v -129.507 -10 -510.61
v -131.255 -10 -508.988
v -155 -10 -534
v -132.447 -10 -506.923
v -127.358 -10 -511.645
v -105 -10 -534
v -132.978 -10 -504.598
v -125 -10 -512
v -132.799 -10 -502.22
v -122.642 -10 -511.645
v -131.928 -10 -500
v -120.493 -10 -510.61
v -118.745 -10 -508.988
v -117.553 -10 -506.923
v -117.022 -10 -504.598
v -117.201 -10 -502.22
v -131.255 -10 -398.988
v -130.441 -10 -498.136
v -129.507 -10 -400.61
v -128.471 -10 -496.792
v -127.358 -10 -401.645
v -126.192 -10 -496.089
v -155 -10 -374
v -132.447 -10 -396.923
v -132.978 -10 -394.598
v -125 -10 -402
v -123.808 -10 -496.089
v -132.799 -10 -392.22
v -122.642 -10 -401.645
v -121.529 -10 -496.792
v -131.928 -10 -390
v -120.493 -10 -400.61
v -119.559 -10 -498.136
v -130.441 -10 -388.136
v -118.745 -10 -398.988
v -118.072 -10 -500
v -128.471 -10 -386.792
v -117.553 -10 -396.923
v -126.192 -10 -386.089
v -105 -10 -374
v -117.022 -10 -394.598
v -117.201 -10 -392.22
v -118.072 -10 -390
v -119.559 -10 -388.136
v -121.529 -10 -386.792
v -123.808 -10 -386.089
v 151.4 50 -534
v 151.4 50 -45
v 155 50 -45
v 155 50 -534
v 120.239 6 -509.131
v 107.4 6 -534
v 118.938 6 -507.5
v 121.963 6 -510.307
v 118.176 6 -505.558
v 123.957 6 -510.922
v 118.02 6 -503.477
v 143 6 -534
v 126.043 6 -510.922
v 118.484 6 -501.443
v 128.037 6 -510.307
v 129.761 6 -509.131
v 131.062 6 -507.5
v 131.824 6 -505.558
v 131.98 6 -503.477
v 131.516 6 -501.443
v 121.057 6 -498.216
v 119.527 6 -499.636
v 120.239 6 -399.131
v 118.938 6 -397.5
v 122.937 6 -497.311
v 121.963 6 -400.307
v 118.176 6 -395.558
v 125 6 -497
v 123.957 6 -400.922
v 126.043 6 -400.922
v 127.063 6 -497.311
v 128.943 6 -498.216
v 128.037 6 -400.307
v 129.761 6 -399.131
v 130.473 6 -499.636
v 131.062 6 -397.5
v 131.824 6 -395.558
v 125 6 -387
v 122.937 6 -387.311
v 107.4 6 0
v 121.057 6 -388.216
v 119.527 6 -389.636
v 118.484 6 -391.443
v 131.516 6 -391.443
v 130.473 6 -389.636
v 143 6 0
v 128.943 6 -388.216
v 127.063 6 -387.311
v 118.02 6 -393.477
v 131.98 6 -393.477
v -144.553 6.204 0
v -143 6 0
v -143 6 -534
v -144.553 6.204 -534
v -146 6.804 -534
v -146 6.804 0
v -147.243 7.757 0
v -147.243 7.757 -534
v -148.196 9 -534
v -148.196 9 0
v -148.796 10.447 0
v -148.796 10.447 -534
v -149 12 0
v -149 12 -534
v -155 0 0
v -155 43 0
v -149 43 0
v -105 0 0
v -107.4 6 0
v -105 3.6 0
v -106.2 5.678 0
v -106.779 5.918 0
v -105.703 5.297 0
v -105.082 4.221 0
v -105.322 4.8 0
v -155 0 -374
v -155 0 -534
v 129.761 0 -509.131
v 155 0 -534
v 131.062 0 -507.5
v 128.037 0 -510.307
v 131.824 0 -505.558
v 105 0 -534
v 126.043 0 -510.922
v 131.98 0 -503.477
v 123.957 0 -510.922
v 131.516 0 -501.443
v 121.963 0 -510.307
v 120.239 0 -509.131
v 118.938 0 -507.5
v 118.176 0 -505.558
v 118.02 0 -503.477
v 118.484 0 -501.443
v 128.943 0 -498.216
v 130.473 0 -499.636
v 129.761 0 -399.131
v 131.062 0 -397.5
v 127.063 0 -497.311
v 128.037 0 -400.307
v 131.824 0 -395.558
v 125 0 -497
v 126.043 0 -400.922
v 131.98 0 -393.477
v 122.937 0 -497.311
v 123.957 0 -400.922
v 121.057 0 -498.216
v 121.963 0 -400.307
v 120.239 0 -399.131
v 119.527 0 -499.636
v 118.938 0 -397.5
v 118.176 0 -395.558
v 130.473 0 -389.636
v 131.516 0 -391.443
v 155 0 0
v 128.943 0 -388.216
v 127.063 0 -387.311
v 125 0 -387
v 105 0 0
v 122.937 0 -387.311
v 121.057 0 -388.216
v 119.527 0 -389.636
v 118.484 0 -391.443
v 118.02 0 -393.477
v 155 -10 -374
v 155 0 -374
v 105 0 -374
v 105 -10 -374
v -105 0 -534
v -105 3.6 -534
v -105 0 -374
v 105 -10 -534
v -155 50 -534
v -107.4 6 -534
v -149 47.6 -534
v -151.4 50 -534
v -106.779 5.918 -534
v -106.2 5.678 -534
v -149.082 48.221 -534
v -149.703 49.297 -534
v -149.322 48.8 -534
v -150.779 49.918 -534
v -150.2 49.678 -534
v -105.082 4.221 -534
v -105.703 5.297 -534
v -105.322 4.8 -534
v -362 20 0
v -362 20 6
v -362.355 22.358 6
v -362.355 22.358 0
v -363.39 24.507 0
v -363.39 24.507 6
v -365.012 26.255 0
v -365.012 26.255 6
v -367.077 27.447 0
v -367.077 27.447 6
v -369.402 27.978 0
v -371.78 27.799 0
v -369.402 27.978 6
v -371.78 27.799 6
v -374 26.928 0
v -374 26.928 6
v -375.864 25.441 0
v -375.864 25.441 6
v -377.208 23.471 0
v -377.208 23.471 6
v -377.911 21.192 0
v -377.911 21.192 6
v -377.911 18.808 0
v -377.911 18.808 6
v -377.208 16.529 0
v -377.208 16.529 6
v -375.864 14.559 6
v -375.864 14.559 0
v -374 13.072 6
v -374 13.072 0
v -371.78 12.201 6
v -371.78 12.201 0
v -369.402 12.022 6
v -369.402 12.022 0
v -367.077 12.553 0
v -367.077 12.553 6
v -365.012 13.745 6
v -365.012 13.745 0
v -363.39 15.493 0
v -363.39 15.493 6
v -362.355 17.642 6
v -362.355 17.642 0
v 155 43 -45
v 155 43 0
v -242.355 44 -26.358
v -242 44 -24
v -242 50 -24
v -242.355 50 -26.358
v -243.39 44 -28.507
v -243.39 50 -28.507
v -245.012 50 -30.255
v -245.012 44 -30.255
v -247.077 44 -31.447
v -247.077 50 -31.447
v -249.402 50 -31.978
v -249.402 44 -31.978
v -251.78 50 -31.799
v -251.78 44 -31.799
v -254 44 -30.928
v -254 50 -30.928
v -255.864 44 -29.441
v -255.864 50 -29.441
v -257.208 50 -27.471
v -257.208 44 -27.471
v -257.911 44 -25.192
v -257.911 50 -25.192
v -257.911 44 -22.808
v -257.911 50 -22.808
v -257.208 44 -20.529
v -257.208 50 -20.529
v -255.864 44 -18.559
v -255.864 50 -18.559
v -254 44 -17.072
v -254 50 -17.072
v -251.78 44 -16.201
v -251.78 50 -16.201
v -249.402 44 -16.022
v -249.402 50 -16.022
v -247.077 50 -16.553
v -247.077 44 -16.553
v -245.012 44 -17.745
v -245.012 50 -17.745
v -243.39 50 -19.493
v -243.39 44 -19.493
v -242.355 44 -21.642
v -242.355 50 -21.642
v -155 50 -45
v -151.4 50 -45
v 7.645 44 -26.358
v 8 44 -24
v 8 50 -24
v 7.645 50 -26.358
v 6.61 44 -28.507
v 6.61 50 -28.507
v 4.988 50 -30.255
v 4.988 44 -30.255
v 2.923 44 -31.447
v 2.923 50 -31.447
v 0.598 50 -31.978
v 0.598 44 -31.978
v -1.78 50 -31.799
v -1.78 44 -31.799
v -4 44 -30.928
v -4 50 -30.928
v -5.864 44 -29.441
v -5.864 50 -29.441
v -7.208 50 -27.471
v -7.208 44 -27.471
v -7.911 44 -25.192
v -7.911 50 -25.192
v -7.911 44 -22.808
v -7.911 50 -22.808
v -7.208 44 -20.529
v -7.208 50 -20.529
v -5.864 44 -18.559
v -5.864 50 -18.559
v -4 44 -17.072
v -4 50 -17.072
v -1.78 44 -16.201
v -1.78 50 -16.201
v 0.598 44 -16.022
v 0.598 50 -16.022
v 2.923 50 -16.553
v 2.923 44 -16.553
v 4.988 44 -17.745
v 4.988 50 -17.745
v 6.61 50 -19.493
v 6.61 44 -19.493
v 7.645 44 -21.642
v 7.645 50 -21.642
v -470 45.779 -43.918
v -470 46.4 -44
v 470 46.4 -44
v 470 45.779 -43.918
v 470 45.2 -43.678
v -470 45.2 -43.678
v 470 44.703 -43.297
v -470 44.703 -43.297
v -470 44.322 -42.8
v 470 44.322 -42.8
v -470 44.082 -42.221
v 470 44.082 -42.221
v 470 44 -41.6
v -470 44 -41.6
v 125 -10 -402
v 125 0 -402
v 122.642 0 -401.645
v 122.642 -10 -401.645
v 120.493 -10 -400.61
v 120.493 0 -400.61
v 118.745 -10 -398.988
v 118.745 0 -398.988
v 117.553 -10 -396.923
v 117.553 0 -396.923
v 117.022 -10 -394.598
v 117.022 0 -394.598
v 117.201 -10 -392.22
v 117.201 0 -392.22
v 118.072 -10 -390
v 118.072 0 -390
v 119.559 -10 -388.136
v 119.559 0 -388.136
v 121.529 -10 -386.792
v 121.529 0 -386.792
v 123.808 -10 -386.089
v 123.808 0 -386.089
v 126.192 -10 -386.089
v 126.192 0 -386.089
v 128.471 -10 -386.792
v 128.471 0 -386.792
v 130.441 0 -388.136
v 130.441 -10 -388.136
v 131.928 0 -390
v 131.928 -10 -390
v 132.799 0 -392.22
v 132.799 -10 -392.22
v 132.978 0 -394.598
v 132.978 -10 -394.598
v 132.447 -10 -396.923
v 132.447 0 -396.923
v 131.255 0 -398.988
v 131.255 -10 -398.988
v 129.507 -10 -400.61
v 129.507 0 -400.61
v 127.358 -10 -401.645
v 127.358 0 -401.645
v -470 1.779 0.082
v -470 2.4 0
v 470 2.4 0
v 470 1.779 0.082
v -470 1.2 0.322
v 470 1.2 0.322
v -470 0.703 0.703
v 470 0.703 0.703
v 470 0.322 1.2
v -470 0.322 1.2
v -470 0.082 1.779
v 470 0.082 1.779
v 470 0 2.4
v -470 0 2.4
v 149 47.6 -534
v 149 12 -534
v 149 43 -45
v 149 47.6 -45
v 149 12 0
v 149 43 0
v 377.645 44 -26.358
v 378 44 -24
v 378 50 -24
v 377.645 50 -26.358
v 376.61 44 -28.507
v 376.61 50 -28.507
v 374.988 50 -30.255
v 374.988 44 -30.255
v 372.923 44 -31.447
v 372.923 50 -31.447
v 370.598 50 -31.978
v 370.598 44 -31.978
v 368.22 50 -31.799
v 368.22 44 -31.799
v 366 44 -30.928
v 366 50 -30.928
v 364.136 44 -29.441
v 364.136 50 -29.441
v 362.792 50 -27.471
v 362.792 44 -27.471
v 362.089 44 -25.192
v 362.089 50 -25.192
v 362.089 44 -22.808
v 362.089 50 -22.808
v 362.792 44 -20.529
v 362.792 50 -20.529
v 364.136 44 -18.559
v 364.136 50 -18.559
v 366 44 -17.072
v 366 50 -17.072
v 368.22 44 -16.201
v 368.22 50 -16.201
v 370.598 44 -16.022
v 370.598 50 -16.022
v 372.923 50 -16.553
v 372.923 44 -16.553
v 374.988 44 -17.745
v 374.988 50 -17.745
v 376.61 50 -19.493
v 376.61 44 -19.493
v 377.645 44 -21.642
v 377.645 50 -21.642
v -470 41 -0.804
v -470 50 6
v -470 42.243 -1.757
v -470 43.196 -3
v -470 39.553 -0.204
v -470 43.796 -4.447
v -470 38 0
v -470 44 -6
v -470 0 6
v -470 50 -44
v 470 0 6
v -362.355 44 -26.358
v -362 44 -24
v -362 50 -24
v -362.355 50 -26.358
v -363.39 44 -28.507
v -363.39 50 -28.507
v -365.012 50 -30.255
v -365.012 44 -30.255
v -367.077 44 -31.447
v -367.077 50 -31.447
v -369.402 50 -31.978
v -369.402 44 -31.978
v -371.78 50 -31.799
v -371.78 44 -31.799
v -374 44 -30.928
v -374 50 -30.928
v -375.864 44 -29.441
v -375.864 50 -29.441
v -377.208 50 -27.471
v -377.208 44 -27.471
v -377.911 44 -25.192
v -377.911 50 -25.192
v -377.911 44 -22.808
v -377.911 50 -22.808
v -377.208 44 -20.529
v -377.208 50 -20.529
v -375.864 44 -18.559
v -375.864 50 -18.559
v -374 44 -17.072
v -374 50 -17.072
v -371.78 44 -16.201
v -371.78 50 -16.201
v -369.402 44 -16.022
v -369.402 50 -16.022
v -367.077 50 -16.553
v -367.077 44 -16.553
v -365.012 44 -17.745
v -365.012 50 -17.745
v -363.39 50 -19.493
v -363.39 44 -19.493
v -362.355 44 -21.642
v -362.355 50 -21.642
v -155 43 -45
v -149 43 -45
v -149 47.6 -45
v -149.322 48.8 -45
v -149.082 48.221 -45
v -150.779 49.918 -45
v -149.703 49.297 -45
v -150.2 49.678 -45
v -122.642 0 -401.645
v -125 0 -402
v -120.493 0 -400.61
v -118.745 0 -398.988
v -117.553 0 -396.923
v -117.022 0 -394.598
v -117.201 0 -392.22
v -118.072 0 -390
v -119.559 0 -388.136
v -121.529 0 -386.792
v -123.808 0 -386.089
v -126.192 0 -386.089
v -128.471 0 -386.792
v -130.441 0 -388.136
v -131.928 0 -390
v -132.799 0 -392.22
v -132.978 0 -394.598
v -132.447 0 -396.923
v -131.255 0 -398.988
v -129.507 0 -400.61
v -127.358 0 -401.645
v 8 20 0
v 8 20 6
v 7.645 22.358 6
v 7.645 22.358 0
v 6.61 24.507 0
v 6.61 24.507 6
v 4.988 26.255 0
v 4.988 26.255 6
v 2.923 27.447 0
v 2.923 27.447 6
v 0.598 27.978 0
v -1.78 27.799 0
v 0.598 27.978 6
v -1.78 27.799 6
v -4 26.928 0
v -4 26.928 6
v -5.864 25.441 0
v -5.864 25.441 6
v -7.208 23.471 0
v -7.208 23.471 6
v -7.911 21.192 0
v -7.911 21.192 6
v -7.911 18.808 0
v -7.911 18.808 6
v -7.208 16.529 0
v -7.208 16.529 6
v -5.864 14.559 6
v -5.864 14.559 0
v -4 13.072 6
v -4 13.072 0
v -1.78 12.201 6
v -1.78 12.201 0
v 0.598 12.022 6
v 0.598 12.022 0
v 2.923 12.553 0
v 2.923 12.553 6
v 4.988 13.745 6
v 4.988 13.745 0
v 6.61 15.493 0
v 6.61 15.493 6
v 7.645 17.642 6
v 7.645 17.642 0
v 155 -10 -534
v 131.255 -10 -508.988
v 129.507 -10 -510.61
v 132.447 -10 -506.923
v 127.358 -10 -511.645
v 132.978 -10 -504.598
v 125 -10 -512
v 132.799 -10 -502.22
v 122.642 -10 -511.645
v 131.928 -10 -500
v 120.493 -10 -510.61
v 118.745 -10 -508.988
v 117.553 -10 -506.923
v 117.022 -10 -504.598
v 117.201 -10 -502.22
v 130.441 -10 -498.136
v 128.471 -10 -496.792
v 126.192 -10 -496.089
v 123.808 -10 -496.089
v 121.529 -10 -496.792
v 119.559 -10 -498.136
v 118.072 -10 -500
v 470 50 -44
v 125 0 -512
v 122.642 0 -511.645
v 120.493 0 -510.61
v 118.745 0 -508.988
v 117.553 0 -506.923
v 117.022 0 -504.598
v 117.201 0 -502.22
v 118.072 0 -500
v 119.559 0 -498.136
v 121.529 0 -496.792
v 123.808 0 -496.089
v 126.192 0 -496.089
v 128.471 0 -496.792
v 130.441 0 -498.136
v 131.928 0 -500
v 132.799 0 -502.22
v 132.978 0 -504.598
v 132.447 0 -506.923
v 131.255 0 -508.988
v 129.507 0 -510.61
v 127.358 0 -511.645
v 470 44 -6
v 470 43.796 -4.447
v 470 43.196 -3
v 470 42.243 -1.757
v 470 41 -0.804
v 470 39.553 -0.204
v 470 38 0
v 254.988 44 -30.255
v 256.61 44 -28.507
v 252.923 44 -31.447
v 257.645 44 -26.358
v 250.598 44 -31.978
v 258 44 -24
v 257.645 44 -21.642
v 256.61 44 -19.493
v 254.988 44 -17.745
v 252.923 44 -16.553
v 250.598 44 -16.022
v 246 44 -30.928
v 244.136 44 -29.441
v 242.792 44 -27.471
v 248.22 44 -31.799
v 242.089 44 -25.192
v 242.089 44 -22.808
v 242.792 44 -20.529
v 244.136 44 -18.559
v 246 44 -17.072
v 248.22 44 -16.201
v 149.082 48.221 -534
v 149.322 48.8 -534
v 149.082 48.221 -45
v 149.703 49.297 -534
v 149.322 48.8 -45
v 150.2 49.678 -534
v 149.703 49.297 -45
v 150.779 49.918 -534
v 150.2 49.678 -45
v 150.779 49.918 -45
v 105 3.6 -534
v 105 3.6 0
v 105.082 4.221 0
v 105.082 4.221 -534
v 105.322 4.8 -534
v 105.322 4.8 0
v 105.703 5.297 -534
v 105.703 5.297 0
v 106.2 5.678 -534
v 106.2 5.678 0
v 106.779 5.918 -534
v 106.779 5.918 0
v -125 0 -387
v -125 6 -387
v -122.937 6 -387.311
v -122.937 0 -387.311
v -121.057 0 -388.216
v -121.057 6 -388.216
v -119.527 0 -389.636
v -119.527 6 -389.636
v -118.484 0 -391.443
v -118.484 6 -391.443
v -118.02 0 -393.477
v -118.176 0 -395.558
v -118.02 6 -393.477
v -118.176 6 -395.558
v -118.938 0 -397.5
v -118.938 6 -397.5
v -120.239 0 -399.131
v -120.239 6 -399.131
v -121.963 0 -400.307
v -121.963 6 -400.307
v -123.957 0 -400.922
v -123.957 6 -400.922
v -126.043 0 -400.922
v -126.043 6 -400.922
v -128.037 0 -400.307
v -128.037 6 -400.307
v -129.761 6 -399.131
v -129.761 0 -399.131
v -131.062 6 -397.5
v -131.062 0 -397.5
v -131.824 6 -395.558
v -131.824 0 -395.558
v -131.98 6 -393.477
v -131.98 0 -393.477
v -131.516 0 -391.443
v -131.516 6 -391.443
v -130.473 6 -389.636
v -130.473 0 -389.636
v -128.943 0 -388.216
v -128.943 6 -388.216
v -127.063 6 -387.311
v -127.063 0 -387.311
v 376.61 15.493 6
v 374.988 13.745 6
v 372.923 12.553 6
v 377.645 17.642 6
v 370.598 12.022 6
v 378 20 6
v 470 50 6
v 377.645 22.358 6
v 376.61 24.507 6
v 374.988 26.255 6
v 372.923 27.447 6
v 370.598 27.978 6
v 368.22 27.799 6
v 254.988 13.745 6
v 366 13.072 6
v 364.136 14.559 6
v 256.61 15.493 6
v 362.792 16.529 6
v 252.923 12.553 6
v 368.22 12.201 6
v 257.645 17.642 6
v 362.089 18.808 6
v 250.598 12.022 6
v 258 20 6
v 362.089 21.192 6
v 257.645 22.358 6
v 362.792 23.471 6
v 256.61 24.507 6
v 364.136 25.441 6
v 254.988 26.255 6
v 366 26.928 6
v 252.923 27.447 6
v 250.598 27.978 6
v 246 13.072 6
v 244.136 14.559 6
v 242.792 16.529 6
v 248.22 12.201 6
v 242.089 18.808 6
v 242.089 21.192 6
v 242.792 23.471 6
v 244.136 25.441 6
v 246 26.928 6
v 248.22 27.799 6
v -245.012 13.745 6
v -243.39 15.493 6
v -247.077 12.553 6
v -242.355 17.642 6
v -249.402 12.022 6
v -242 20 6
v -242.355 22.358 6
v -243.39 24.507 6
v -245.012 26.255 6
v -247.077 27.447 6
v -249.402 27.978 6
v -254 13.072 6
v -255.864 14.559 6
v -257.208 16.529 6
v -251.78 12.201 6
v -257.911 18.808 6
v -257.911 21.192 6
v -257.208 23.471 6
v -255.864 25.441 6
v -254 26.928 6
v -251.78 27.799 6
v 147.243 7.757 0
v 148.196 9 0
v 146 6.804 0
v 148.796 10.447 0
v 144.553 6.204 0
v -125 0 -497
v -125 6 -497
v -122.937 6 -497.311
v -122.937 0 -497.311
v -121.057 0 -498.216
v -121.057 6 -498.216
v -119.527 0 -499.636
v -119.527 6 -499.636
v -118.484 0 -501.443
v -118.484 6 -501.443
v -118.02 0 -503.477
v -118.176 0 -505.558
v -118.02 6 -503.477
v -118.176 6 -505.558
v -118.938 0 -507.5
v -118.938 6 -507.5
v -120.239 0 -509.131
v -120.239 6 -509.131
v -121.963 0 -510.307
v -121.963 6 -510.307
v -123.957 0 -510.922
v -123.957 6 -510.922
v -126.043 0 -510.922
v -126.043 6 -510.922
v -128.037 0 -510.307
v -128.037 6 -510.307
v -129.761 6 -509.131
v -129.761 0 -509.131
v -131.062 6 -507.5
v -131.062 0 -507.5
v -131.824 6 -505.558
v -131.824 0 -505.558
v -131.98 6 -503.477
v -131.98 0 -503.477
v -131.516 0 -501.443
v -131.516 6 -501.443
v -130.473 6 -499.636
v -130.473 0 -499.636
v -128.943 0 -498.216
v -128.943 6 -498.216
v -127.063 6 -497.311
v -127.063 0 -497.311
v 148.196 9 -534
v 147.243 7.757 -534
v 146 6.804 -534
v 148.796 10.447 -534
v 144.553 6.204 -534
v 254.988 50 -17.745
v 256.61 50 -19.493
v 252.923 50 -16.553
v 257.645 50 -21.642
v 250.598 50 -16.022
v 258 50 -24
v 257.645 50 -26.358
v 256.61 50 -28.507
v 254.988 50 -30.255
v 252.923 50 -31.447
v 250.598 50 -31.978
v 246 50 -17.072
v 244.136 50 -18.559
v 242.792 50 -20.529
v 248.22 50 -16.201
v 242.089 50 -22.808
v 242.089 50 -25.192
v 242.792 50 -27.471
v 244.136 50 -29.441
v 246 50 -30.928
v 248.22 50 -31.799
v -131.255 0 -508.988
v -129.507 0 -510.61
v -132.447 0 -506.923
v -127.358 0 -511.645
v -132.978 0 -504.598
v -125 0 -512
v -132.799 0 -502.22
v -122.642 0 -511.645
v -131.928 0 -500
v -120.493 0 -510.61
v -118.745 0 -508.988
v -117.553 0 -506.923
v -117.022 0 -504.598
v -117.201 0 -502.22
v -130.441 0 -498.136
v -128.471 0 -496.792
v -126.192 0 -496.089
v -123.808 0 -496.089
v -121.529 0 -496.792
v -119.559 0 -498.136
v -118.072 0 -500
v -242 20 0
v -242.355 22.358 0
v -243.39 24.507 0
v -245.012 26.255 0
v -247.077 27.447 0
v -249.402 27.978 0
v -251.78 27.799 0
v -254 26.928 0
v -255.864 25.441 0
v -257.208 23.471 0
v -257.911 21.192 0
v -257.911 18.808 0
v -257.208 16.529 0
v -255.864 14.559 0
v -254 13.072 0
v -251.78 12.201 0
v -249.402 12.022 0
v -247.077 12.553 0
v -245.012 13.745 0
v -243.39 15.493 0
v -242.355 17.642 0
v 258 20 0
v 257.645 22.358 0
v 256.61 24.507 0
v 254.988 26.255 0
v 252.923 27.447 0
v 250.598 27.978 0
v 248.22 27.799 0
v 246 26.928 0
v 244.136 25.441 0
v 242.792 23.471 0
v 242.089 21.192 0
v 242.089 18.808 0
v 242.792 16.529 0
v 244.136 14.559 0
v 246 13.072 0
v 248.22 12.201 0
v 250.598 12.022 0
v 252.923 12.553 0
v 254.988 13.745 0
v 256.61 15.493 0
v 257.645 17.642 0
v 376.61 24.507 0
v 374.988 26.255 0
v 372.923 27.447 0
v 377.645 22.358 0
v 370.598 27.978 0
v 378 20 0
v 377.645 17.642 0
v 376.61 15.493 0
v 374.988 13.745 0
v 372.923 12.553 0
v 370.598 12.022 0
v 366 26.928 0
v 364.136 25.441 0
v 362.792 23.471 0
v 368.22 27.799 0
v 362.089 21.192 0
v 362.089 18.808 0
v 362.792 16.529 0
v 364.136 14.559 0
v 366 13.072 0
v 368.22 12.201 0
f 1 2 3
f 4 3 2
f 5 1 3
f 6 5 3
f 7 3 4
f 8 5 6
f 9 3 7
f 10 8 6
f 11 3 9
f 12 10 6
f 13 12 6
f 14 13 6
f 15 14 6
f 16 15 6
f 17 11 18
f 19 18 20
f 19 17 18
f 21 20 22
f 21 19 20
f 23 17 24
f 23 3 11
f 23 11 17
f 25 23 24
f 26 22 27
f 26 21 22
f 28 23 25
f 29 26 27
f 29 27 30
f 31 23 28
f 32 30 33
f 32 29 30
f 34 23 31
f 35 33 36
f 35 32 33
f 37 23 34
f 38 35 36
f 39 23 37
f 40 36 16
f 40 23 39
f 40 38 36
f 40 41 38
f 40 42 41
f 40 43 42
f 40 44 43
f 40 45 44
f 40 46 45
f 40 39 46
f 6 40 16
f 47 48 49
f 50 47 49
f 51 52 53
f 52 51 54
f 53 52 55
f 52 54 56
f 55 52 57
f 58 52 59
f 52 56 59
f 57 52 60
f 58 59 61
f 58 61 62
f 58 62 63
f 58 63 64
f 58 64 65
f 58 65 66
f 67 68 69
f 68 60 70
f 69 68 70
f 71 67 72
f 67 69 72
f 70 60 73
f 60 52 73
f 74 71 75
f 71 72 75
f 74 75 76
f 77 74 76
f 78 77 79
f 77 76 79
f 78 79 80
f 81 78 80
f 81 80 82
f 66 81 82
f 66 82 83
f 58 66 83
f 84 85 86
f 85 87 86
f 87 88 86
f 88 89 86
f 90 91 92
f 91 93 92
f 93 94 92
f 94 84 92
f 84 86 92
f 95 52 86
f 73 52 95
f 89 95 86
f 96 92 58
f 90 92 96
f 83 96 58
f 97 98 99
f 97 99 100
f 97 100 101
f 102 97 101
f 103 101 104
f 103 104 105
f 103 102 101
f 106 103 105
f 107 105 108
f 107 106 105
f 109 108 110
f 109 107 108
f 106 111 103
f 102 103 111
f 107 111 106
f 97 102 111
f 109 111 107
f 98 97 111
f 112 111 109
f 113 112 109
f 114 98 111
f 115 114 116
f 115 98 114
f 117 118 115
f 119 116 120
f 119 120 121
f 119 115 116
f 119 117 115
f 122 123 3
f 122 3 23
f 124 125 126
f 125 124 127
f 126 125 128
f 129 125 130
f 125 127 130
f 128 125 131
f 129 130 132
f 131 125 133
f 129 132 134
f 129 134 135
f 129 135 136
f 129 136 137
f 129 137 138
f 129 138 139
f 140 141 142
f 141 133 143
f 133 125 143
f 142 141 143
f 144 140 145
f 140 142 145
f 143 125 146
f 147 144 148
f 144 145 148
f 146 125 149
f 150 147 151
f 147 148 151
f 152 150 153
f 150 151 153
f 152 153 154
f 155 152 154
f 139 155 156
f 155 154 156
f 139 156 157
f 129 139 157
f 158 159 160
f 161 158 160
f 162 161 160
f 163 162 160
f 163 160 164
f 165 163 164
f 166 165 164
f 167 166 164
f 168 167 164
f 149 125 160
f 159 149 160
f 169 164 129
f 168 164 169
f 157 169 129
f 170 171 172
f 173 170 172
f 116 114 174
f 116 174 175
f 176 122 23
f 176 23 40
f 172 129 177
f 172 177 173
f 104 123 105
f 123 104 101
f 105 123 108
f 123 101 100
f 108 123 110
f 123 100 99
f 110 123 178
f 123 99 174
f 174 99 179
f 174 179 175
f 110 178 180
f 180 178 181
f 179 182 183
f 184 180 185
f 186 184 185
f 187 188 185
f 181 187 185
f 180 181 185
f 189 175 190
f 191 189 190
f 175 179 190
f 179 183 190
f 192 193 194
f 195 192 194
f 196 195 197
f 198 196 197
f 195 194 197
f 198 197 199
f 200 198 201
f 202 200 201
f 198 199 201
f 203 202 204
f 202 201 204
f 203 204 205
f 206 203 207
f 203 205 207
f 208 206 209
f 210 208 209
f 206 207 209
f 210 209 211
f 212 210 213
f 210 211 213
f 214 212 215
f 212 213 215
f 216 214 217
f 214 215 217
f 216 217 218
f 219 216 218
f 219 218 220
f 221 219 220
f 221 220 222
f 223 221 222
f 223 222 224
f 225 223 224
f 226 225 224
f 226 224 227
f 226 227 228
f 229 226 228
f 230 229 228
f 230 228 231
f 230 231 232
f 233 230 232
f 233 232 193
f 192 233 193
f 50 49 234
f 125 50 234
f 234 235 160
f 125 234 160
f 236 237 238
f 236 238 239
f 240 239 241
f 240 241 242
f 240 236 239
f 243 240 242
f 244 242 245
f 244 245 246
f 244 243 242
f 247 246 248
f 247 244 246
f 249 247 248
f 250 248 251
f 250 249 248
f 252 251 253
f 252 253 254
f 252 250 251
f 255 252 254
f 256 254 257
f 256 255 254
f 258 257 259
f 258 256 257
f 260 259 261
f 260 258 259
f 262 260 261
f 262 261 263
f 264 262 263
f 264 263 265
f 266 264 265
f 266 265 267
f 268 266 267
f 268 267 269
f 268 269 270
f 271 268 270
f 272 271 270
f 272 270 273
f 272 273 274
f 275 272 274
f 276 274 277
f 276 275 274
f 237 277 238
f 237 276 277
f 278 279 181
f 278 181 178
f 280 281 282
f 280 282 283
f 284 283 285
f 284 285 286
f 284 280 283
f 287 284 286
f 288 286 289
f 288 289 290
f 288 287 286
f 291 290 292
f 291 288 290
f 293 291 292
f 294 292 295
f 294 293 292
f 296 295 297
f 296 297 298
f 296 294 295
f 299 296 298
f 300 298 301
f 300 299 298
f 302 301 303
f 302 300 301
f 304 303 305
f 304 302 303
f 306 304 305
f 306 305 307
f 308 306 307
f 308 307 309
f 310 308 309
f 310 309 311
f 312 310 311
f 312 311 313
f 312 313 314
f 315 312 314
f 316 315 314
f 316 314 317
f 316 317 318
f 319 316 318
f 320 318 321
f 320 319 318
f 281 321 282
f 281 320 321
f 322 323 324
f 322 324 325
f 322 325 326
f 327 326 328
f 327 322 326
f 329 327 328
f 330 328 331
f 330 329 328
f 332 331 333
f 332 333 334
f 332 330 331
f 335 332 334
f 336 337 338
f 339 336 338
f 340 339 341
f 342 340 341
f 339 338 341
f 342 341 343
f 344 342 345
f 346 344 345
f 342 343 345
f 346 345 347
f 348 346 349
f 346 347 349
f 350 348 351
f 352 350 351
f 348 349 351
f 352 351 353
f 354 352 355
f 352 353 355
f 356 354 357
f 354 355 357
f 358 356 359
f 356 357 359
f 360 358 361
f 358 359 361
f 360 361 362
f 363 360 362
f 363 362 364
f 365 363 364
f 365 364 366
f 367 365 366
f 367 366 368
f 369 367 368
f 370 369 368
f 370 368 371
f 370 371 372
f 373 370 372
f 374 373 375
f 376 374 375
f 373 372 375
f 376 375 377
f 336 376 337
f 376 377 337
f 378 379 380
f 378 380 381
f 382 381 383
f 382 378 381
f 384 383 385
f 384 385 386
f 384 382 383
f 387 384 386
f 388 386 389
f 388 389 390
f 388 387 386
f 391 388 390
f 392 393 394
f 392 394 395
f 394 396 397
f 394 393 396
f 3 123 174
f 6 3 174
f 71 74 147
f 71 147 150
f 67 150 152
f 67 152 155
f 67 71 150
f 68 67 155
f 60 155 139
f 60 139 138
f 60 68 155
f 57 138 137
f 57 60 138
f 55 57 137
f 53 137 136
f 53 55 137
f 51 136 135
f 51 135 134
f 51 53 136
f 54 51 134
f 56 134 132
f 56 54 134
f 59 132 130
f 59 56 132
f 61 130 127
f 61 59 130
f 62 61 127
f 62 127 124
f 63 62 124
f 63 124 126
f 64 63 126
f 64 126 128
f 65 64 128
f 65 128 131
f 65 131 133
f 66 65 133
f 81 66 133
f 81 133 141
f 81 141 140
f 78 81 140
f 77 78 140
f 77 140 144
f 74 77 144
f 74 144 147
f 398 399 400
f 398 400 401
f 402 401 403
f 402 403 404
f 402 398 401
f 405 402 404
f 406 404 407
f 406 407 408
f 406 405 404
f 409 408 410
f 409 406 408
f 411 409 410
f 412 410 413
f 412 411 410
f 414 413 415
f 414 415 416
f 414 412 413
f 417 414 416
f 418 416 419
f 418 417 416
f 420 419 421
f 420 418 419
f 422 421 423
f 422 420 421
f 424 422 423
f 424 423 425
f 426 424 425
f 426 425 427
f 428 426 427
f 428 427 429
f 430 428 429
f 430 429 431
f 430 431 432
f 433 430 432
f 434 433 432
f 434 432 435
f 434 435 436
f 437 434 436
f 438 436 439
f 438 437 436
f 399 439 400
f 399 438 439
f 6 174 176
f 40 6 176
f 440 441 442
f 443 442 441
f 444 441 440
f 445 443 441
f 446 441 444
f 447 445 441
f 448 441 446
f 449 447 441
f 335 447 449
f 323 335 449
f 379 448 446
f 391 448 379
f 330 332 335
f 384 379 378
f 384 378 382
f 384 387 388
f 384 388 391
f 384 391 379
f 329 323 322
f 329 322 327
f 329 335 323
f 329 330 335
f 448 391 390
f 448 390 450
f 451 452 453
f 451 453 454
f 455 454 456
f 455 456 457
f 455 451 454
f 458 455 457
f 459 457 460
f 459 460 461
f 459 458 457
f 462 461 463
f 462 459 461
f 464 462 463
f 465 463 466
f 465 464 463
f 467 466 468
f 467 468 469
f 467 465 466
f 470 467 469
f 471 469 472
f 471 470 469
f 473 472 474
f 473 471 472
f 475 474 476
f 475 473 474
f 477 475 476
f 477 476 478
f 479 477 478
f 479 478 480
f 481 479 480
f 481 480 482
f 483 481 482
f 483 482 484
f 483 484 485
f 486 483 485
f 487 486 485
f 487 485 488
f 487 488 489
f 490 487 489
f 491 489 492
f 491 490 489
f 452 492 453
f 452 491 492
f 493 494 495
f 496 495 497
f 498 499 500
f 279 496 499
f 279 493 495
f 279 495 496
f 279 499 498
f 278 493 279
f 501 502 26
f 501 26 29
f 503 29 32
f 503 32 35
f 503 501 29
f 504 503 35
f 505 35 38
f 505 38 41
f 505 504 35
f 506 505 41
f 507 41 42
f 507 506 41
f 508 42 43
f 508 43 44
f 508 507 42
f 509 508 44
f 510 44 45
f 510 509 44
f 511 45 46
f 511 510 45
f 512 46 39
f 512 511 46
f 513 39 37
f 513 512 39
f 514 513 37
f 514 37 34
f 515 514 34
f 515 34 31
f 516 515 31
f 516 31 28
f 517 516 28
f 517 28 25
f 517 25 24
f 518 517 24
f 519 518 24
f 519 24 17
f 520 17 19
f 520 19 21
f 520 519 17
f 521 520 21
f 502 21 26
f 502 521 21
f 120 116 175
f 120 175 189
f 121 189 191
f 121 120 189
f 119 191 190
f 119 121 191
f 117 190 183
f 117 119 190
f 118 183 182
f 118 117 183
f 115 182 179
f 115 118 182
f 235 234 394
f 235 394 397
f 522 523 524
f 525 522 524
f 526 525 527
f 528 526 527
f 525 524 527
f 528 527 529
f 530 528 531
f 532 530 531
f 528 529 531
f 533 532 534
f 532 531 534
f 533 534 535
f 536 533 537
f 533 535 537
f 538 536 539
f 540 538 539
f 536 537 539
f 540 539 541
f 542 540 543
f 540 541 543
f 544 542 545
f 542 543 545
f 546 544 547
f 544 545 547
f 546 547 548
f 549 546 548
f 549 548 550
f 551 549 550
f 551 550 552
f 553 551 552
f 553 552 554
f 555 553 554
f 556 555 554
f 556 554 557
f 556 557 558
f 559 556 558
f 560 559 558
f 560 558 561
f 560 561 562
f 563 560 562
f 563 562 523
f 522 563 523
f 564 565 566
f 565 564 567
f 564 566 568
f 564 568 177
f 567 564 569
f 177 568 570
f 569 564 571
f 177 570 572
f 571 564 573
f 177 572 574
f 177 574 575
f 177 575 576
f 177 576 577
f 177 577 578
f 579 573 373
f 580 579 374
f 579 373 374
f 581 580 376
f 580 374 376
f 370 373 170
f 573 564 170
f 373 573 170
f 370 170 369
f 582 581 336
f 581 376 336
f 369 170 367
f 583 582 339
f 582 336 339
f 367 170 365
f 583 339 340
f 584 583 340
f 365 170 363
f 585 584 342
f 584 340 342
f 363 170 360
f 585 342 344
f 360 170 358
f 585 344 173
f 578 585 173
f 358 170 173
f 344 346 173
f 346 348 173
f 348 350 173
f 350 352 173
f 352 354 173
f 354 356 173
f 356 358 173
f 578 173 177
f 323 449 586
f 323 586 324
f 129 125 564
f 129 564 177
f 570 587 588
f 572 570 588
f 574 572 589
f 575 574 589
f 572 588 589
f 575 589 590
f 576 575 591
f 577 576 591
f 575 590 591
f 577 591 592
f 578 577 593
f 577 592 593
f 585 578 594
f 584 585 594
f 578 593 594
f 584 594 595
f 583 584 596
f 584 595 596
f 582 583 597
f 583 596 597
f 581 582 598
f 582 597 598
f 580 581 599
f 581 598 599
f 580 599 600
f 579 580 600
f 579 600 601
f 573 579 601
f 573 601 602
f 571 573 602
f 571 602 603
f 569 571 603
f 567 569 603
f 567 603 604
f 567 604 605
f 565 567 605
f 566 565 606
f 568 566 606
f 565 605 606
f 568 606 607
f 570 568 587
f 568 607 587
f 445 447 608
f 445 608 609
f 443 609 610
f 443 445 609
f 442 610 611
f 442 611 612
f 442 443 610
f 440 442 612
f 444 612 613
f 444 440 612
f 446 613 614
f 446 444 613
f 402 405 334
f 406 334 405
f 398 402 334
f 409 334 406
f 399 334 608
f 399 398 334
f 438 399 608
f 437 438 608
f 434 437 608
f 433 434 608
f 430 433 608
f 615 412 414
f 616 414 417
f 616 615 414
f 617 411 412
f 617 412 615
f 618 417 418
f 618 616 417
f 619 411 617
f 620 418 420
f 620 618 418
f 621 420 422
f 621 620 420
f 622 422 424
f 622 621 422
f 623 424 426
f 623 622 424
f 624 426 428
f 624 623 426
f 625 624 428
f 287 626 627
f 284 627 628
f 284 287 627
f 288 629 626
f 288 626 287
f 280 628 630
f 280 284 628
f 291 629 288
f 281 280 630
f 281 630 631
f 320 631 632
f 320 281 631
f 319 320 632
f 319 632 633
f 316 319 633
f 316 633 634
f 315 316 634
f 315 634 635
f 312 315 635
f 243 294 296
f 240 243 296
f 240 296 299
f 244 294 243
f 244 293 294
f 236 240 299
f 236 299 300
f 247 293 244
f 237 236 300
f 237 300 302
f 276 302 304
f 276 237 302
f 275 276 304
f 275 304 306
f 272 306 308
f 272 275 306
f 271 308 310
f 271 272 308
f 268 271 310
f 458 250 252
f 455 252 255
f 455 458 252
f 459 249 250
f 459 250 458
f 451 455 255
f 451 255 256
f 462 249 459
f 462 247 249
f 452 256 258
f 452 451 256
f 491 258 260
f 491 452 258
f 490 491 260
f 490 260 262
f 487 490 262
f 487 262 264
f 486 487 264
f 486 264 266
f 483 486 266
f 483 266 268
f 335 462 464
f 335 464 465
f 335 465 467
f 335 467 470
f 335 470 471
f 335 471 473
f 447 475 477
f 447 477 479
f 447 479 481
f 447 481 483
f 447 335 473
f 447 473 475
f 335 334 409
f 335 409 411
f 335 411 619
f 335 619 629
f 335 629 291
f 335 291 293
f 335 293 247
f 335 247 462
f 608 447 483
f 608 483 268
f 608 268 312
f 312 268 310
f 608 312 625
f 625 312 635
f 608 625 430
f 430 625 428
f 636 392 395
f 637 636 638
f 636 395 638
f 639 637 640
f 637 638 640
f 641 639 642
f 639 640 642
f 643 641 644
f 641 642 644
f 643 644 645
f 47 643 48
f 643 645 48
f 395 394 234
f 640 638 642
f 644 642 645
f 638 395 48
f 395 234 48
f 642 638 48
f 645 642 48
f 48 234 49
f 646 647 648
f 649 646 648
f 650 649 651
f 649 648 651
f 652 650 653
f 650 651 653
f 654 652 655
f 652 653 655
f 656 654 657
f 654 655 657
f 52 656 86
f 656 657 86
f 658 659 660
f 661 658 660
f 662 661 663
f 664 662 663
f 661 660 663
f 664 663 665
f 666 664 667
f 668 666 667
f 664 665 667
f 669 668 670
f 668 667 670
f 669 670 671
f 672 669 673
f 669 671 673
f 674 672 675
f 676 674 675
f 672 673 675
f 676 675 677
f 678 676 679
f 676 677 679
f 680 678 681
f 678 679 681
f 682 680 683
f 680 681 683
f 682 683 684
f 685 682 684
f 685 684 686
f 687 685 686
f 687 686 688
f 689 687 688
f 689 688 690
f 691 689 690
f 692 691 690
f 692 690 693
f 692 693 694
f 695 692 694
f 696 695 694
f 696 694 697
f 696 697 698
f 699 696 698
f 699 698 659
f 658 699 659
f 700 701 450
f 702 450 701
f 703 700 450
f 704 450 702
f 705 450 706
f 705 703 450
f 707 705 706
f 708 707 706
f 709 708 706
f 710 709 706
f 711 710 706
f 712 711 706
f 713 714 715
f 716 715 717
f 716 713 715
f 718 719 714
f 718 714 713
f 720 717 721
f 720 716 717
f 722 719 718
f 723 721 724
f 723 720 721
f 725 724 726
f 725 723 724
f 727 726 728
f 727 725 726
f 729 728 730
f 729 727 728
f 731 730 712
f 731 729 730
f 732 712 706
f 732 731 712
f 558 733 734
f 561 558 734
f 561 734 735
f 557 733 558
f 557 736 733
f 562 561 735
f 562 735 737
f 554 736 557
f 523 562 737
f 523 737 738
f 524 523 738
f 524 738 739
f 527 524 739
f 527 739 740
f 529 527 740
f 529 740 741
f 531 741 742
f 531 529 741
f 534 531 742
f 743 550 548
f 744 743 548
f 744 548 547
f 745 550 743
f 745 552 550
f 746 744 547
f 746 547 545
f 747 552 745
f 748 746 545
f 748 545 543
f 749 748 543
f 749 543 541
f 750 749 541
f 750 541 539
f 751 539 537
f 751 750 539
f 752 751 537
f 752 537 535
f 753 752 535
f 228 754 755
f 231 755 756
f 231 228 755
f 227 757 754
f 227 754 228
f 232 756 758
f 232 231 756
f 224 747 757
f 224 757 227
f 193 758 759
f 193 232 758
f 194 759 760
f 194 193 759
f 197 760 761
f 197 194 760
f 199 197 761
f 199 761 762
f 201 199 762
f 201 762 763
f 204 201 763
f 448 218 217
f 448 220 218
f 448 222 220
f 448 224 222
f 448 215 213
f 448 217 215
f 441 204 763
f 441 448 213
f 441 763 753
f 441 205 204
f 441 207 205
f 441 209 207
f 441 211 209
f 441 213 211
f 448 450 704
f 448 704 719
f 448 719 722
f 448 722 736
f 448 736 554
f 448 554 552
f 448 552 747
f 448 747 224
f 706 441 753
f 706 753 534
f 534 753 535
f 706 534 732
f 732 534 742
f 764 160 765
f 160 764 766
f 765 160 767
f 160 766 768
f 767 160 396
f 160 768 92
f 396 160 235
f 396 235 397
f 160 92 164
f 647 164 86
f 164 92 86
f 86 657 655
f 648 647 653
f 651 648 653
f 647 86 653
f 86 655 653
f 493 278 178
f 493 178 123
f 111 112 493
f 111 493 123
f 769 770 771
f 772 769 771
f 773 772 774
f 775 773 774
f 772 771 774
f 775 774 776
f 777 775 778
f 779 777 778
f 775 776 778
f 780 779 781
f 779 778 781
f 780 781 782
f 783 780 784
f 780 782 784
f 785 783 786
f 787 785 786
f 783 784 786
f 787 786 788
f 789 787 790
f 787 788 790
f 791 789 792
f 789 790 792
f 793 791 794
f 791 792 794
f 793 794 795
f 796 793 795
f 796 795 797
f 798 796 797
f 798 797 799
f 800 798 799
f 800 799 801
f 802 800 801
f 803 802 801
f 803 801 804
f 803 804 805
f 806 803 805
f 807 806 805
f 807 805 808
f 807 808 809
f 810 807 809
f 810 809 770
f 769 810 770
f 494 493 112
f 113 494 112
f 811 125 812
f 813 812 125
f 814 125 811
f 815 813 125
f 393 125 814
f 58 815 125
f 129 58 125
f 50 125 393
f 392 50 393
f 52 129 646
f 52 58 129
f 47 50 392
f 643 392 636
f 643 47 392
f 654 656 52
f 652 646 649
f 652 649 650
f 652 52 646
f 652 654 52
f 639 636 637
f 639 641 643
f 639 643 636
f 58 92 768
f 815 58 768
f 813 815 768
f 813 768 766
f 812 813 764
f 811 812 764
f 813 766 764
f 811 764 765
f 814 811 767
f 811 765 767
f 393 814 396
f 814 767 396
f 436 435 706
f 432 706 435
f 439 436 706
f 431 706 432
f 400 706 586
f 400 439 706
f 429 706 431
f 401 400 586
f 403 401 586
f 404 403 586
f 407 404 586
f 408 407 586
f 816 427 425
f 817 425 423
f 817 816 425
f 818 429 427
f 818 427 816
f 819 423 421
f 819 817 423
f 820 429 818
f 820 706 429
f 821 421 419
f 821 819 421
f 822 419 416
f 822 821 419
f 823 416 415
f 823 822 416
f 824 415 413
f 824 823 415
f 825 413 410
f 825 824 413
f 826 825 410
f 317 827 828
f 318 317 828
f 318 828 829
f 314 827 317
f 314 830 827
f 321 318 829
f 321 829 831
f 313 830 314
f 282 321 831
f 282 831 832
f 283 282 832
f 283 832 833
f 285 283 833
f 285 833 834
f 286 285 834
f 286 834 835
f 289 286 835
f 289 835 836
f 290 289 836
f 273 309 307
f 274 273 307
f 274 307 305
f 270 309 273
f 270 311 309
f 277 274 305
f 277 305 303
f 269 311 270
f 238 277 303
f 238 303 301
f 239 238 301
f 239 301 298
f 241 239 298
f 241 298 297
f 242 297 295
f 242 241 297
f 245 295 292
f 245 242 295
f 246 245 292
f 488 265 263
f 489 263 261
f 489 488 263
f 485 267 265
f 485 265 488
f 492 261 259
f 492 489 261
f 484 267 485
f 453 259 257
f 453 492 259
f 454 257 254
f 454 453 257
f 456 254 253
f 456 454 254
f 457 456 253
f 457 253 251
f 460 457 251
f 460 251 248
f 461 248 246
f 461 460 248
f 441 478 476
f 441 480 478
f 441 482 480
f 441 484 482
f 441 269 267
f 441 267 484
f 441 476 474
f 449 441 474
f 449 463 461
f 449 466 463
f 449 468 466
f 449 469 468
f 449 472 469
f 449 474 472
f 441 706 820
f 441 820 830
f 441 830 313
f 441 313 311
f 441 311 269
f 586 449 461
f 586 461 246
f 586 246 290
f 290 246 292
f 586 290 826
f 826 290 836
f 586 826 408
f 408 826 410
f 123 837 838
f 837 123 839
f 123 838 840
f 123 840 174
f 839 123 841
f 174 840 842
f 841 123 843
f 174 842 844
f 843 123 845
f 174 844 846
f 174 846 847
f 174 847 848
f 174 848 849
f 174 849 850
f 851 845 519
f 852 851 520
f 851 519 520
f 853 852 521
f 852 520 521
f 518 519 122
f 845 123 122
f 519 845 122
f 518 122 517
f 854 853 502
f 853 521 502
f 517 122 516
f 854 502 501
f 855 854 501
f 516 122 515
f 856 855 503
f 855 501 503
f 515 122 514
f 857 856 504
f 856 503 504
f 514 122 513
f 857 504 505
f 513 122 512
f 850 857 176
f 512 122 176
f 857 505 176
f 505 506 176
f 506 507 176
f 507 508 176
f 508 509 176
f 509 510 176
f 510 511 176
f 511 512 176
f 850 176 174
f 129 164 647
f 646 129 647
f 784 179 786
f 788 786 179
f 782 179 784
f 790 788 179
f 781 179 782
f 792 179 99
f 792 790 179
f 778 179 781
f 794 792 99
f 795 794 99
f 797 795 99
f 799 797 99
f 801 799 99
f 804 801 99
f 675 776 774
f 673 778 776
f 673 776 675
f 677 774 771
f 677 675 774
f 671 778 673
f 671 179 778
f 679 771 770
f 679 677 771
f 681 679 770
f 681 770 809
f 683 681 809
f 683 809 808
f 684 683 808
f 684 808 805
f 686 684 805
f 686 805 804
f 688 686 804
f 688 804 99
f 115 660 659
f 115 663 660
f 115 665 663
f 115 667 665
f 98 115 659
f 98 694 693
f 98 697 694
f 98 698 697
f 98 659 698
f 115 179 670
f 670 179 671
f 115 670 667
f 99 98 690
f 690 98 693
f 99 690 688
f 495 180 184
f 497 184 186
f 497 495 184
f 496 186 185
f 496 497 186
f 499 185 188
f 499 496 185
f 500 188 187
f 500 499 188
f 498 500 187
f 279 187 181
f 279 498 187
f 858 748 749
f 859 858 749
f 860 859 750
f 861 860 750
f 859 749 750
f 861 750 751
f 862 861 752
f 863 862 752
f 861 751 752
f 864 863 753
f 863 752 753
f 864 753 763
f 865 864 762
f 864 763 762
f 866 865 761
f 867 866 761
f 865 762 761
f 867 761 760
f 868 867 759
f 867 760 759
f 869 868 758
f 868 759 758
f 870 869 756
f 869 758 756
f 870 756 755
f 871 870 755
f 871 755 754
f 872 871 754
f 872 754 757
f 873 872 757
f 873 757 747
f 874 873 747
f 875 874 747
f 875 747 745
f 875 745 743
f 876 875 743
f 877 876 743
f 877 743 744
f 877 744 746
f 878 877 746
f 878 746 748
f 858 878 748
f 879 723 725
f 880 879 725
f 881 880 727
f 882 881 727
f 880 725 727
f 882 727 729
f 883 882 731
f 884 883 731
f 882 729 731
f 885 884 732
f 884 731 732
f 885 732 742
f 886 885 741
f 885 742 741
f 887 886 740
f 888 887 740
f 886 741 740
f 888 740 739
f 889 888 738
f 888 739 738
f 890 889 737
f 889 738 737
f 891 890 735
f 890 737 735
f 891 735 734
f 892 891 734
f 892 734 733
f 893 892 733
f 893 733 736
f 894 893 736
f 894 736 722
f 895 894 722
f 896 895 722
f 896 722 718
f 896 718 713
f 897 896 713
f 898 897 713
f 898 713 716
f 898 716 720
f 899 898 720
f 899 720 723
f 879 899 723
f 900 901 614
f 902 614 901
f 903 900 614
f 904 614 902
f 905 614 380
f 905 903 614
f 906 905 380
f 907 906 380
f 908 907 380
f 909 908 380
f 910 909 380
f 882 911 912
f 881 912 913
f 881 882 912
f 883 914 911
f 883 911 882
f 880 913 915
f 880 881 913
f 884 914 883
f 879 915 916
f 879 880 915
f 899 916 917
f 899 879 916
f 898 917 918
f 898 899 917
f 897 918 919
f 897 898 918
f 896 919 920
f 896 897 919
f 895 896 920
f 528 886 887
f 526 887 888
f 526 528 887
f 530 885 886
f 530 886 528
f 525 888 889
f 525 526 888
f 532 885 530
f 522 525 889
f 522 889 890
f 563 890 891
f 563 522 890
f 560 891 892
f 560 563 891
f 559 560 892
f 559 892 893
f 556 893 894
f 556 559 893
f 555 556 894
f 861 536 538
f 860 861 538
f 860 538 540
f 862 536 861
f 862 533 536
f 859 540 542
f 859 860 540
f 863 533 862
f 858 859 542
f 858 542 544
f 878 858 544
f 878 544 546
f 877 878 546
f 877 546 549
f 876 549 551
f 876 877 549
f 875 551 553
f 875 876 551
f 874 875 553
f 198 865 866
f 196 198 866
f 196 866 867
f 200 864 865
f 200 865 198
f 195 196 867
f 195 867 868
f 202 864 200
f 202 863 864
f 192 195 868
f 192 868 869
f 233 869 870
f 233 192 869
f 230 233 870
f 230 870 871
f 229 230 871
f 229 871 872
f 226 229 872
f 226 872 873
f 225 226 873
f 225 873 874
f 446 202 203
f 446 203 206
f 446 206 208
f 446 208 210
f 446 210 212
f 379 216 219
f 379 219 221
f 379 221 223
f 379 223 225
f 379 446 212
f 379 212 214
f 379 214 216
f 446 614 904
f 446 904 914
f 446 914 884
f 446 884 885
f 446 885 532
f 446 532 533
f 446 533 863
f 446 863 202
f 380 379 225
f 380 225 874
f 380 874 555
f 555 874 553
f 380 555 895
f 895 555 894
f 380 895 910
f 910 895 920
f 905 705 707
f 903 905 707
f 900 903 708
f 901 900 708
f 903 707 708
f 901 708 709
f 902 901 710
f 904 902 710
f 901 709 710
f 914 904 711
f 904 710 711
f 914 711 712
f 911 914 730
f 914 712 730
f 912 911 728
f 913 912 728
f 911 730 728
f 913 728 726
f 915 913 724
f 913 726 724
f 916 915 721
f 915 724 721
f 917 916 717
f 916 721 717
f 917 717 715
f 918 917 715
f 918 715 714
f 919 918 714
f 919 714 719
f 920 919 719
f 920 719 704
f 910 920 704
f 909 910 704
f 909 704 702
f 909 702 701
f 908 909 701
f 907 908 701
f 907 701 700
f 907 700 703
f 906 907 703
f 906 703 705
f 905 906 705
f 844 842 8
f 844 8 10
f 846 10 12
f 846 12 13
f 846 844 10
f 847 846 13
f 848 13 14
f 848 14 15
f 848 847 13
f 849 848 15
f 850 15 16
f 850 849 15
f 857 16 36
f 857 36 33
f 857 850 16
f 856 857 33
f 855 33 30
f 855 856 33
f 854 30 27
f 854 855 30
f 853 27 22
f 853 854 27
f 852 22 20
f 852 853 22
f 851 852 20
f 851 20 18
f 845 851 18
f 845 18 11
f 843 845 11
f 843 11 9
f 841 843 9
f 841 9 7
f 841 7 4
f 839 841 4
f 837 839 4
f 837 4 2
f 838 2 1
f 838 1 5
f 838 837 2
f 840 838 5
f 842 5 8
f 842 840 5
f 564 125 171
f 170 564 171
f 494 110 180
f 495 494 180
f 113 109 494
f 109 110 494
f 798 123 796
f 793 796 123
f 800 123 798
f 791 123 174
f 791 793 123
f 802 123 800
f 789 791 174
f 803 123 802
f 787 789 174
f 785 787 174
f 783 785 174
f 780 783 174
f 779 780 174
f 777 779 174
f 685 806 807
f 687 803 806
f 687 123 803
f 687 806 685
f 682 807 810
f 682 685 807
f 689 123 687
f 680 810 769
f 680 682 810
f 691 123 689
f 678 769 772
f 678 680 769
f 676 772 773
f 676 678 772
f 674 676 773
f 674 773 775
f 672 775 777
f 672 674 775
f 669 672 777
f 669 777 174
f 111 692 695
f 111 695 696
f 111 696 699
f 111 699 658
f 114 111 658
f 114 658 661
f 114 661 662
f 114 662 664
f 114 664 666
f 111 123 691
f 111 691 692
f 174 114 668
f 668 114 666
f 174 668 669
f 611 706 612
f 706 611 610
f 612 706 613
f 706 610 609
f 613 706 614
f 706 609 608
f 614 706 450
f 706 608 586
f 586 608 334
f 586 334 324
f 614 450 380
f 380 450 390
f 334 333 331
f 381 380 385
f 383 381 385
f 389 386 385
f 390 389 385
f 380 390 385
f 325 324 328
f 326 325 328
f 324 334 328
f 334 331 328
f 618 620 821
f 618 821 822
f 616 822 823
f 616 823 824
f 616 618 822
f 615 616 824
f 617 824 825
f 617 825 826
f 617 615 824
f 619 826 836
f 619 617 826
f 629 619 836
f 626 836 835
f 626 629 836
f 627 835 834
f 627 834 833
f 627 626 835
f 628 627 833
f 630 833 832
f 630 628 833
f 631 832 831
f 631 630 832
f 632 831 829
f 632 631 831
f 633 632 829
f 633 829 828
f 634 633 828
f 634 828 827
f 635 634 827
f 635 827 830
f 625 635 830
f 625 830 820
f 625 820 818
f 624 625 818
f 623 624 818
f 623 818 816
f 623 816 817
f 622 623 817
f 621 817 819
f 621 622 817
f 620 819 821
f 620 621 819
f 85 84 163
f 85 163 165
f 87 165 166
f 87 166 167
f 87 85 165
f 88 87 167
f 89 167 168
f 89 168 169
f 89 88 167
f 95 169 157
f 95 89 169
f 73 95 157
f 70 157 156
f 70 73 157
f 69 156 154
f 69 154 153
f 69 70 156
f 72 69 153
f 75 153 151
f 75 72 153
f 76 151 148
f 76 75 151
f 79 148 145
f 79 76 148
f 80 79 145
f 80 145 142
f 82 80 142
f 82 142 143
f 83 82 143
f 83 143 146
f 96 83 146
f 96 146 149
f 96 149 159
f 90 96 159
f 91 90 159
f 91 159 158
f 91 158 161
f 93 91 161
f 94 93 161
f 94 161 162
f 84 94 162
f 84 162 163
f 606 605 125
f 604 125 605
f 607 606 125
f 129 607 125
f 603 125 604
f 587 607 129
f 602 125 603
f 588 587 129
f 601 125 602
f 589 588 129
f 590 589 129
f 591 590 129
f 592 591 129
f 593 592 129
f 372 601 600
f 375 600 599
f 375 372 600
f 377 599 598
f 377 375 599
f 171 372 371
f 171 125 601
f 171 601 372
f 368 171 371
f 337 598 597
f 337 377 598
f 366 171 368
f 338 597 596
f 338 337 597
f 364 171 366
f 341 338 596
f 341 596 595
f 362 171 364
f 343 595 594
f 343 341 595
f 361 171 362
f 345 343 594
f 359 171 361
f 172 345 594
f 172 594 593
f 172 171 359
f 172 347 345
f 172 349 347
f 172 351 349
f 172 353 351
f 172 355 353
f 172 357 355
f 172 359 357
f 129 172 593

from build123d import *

# Parameters (mm, degrees)
STRUCTURAL_MEMBER1_DEPTH = 940
HOLE1_START              = 44
HOLE1_OUTLINE_R          = 8
HOLE1_DEPTH              = 6
SKETCH17_R               = 8
CUT_EXTRUDE2_DEPTH       = 476.289385533
STRUCTURAL_MEMBER2_DEPTH = 534
SKETCH16_R               = 7
MOUNTING_HOLES_DEPTH     = 713.735575091
SKETCH112_W              = 45
SKETCH112_H              = 7
CUT_EXTRUDE3_DEPTH       = 6
SKETCH118_W              = 50
SKETCH118_H              = 160
SKETCH118_R              = 8
BOSS_EXTRUDE1_DEPTH      = 10


# Read off the part's stored shape, not the designer's step: Hole1
with BuildPart() as part:
    # Sketch12 → Structural Member1 (new body)
    with BuildSketch(Plane(origin=(-470, 50, 6), x_dir=(0, 0, -1), z_dir=(-1, 0, 0))):
        with BuildLine():
            Line((0, 50), (0, 0))
            Line((0, 0), (50, 0))
            Line((50, 0), (50, 3.6))
            ThreePointArc((50, 3.6), (49.297056275, 5.297056275), (47.6, 6))
            Line((47.6, 6), (12, 6))
            ThreePointArc((12, 6), (7.757359313, 7.757359313), (6, 12))
            Line((6, 12), (6, 47.6))
            ThreePointArc((6, 47.6), (5.297056275, 49.297056275), (3.6, 50))
            Line((3.6, 50), (0, 50))
        make_face()
    extrude(amount=-STRUCTURAL_MEMBER1_DEPTH)

    # Hole1 outline → Hole1 (cut)
    with BuildSketch(Plane(origin=(0, 0, 0), x_dir=(1, 0, 0), z_dir=(0, 1, 0)).offset(HOLE1_START)):
        with Locations((-250, 24)):
            Circle(HOLE1_OUTLINE_R)
        with Locations((0, 24)):
            Circle(HOLE1_OUTLINE_R)
        with Locations((-370, 24)):
            Circle(HOLE1_OUTLINE_R)
        with Locations((370, 24)):
            Circle(HOLE1_OUTLINE_R)
        with Locations((250, 24)):
            Circle(HOLE1_OUTLINE_R)
    extrude(amount=HOLE1_DEPTH, mode=Mode.SUBTRACT)

    # Sketch17 → Cut-Extrude2 (cut, through all)
    with BuildSketch(Plane.XY.offset(6)):
        with Locations((250, 20)):
            Circle(SKETCH17_R)
        with Locations((370, 20)):
            Circle(SKETCH17_R)
        with Locations((0, 20)):
            Circle(SKETCH17_R)
        with Locations((-370, 20)):
            Circle(SKETCH17_R)
        with Locations((-250, 20)):
            Circle(SKETCH17_R)
    extrude(amount=-CUT_EXTRUDE2_DEPTH, mode=Mode.SUBTRACT)


with BuildPart() as body_2:
    # Sketch111 → Structural Member2 (new body)
    with BuildSketch(Plane(origin=(-155, 0, 0), x_dir=(1, 0, 0), z_dir=(0, 0, 1))):
        with BuildLine():
            Line((0, 50), (0, 0))
            Line((0, 0), (50, 0))
            Line((50, 0), (50, 3.6))
            ThreePointArc((50, 3.6), (49.297056275, 5.297056275), (47.6, 6))
            Line((47.6, 6), (12, 6))
            ThreePointArc((12, 6), (7.757359313, 7.757359313), (6, 12))
            Line((6, 12), (6, 47.6))
            ThreePointArc((6, 47.6), (5.297056275, 49.297056275), (3.6, 50))
            Line((3.6, 50), (0, 50))
        make_face()
    extrude(amount=-STRUCTURAL_MEMBER2_DEPTH)

    # Sketch16 → Mounting Holes (cut, through all)
    with BuildSketch(Plane(origin=(0, 6, 0), x_dir=(1, 0, 0), z_dir=(0, 1, 0))):
        with Locations(Location((-125, 504, 0), (0, 0, 270))):
            Circle(SKETCH16_R)
        with Locations(Location((-125, 394, 0), (0, 0, 270))):
            Circle(SKETCH16_R)
    extrude(amount=-MOUNTING_HOLES_DEPTH, mode=Mode.SUBTRACT)

    # Sketch112 → Cut-Extrude3 (cut)
    with BuildSketch(Plane.ZY.offset(155)):
        with Locations((-22.5, 46.5)):
            Rectangle(SKETCH112_W, SKETCH112_H)
    extrude(amount=-CUT_EXTRUDE3_DEPTH, mode=Mode.SUBTRACT)


with BuildPart() as body_3:
    # Mirror2: mirrored copy
    add(body_2.part.mirror(Plane(origin=(0, 0, 0), x_dir=(0, 0, 1), z_dir=(1, 0, 0))))


with BuildPart() as body_4:
    # Sketch118 → Boss-Extrude1 (new body)
    with BuildSketch(Plane.XZ):
        with Locations((-130, -454)):
            Rectangle(SKETCH118_W, SKETCH118_H)
        with Locations(Location((-125, -394, 0), (0, 0, 270))):
            Circle(SKETCH118_R, mode=Mode.SUBTRACT)
        with Locations(Location((-125, -504, 0), (0, 0, 270))):
            Circle(SKETCH118_R, mode=Mode.SUBTRACT)
    extrude(amount=BOSS_EXTRUDE1_DEPTH)


with BuildPart() as body_5:
    # Mirror5: mirrored copy
    add(body_4.part.mirror(Plane(origin=(0, 0, 0), x_dir=(0, 0, 1), z_dir=(1, 0, 0))))


solid = Compound([part.part, body_2.part, body_3.part, body_4.part, body_5.part])
